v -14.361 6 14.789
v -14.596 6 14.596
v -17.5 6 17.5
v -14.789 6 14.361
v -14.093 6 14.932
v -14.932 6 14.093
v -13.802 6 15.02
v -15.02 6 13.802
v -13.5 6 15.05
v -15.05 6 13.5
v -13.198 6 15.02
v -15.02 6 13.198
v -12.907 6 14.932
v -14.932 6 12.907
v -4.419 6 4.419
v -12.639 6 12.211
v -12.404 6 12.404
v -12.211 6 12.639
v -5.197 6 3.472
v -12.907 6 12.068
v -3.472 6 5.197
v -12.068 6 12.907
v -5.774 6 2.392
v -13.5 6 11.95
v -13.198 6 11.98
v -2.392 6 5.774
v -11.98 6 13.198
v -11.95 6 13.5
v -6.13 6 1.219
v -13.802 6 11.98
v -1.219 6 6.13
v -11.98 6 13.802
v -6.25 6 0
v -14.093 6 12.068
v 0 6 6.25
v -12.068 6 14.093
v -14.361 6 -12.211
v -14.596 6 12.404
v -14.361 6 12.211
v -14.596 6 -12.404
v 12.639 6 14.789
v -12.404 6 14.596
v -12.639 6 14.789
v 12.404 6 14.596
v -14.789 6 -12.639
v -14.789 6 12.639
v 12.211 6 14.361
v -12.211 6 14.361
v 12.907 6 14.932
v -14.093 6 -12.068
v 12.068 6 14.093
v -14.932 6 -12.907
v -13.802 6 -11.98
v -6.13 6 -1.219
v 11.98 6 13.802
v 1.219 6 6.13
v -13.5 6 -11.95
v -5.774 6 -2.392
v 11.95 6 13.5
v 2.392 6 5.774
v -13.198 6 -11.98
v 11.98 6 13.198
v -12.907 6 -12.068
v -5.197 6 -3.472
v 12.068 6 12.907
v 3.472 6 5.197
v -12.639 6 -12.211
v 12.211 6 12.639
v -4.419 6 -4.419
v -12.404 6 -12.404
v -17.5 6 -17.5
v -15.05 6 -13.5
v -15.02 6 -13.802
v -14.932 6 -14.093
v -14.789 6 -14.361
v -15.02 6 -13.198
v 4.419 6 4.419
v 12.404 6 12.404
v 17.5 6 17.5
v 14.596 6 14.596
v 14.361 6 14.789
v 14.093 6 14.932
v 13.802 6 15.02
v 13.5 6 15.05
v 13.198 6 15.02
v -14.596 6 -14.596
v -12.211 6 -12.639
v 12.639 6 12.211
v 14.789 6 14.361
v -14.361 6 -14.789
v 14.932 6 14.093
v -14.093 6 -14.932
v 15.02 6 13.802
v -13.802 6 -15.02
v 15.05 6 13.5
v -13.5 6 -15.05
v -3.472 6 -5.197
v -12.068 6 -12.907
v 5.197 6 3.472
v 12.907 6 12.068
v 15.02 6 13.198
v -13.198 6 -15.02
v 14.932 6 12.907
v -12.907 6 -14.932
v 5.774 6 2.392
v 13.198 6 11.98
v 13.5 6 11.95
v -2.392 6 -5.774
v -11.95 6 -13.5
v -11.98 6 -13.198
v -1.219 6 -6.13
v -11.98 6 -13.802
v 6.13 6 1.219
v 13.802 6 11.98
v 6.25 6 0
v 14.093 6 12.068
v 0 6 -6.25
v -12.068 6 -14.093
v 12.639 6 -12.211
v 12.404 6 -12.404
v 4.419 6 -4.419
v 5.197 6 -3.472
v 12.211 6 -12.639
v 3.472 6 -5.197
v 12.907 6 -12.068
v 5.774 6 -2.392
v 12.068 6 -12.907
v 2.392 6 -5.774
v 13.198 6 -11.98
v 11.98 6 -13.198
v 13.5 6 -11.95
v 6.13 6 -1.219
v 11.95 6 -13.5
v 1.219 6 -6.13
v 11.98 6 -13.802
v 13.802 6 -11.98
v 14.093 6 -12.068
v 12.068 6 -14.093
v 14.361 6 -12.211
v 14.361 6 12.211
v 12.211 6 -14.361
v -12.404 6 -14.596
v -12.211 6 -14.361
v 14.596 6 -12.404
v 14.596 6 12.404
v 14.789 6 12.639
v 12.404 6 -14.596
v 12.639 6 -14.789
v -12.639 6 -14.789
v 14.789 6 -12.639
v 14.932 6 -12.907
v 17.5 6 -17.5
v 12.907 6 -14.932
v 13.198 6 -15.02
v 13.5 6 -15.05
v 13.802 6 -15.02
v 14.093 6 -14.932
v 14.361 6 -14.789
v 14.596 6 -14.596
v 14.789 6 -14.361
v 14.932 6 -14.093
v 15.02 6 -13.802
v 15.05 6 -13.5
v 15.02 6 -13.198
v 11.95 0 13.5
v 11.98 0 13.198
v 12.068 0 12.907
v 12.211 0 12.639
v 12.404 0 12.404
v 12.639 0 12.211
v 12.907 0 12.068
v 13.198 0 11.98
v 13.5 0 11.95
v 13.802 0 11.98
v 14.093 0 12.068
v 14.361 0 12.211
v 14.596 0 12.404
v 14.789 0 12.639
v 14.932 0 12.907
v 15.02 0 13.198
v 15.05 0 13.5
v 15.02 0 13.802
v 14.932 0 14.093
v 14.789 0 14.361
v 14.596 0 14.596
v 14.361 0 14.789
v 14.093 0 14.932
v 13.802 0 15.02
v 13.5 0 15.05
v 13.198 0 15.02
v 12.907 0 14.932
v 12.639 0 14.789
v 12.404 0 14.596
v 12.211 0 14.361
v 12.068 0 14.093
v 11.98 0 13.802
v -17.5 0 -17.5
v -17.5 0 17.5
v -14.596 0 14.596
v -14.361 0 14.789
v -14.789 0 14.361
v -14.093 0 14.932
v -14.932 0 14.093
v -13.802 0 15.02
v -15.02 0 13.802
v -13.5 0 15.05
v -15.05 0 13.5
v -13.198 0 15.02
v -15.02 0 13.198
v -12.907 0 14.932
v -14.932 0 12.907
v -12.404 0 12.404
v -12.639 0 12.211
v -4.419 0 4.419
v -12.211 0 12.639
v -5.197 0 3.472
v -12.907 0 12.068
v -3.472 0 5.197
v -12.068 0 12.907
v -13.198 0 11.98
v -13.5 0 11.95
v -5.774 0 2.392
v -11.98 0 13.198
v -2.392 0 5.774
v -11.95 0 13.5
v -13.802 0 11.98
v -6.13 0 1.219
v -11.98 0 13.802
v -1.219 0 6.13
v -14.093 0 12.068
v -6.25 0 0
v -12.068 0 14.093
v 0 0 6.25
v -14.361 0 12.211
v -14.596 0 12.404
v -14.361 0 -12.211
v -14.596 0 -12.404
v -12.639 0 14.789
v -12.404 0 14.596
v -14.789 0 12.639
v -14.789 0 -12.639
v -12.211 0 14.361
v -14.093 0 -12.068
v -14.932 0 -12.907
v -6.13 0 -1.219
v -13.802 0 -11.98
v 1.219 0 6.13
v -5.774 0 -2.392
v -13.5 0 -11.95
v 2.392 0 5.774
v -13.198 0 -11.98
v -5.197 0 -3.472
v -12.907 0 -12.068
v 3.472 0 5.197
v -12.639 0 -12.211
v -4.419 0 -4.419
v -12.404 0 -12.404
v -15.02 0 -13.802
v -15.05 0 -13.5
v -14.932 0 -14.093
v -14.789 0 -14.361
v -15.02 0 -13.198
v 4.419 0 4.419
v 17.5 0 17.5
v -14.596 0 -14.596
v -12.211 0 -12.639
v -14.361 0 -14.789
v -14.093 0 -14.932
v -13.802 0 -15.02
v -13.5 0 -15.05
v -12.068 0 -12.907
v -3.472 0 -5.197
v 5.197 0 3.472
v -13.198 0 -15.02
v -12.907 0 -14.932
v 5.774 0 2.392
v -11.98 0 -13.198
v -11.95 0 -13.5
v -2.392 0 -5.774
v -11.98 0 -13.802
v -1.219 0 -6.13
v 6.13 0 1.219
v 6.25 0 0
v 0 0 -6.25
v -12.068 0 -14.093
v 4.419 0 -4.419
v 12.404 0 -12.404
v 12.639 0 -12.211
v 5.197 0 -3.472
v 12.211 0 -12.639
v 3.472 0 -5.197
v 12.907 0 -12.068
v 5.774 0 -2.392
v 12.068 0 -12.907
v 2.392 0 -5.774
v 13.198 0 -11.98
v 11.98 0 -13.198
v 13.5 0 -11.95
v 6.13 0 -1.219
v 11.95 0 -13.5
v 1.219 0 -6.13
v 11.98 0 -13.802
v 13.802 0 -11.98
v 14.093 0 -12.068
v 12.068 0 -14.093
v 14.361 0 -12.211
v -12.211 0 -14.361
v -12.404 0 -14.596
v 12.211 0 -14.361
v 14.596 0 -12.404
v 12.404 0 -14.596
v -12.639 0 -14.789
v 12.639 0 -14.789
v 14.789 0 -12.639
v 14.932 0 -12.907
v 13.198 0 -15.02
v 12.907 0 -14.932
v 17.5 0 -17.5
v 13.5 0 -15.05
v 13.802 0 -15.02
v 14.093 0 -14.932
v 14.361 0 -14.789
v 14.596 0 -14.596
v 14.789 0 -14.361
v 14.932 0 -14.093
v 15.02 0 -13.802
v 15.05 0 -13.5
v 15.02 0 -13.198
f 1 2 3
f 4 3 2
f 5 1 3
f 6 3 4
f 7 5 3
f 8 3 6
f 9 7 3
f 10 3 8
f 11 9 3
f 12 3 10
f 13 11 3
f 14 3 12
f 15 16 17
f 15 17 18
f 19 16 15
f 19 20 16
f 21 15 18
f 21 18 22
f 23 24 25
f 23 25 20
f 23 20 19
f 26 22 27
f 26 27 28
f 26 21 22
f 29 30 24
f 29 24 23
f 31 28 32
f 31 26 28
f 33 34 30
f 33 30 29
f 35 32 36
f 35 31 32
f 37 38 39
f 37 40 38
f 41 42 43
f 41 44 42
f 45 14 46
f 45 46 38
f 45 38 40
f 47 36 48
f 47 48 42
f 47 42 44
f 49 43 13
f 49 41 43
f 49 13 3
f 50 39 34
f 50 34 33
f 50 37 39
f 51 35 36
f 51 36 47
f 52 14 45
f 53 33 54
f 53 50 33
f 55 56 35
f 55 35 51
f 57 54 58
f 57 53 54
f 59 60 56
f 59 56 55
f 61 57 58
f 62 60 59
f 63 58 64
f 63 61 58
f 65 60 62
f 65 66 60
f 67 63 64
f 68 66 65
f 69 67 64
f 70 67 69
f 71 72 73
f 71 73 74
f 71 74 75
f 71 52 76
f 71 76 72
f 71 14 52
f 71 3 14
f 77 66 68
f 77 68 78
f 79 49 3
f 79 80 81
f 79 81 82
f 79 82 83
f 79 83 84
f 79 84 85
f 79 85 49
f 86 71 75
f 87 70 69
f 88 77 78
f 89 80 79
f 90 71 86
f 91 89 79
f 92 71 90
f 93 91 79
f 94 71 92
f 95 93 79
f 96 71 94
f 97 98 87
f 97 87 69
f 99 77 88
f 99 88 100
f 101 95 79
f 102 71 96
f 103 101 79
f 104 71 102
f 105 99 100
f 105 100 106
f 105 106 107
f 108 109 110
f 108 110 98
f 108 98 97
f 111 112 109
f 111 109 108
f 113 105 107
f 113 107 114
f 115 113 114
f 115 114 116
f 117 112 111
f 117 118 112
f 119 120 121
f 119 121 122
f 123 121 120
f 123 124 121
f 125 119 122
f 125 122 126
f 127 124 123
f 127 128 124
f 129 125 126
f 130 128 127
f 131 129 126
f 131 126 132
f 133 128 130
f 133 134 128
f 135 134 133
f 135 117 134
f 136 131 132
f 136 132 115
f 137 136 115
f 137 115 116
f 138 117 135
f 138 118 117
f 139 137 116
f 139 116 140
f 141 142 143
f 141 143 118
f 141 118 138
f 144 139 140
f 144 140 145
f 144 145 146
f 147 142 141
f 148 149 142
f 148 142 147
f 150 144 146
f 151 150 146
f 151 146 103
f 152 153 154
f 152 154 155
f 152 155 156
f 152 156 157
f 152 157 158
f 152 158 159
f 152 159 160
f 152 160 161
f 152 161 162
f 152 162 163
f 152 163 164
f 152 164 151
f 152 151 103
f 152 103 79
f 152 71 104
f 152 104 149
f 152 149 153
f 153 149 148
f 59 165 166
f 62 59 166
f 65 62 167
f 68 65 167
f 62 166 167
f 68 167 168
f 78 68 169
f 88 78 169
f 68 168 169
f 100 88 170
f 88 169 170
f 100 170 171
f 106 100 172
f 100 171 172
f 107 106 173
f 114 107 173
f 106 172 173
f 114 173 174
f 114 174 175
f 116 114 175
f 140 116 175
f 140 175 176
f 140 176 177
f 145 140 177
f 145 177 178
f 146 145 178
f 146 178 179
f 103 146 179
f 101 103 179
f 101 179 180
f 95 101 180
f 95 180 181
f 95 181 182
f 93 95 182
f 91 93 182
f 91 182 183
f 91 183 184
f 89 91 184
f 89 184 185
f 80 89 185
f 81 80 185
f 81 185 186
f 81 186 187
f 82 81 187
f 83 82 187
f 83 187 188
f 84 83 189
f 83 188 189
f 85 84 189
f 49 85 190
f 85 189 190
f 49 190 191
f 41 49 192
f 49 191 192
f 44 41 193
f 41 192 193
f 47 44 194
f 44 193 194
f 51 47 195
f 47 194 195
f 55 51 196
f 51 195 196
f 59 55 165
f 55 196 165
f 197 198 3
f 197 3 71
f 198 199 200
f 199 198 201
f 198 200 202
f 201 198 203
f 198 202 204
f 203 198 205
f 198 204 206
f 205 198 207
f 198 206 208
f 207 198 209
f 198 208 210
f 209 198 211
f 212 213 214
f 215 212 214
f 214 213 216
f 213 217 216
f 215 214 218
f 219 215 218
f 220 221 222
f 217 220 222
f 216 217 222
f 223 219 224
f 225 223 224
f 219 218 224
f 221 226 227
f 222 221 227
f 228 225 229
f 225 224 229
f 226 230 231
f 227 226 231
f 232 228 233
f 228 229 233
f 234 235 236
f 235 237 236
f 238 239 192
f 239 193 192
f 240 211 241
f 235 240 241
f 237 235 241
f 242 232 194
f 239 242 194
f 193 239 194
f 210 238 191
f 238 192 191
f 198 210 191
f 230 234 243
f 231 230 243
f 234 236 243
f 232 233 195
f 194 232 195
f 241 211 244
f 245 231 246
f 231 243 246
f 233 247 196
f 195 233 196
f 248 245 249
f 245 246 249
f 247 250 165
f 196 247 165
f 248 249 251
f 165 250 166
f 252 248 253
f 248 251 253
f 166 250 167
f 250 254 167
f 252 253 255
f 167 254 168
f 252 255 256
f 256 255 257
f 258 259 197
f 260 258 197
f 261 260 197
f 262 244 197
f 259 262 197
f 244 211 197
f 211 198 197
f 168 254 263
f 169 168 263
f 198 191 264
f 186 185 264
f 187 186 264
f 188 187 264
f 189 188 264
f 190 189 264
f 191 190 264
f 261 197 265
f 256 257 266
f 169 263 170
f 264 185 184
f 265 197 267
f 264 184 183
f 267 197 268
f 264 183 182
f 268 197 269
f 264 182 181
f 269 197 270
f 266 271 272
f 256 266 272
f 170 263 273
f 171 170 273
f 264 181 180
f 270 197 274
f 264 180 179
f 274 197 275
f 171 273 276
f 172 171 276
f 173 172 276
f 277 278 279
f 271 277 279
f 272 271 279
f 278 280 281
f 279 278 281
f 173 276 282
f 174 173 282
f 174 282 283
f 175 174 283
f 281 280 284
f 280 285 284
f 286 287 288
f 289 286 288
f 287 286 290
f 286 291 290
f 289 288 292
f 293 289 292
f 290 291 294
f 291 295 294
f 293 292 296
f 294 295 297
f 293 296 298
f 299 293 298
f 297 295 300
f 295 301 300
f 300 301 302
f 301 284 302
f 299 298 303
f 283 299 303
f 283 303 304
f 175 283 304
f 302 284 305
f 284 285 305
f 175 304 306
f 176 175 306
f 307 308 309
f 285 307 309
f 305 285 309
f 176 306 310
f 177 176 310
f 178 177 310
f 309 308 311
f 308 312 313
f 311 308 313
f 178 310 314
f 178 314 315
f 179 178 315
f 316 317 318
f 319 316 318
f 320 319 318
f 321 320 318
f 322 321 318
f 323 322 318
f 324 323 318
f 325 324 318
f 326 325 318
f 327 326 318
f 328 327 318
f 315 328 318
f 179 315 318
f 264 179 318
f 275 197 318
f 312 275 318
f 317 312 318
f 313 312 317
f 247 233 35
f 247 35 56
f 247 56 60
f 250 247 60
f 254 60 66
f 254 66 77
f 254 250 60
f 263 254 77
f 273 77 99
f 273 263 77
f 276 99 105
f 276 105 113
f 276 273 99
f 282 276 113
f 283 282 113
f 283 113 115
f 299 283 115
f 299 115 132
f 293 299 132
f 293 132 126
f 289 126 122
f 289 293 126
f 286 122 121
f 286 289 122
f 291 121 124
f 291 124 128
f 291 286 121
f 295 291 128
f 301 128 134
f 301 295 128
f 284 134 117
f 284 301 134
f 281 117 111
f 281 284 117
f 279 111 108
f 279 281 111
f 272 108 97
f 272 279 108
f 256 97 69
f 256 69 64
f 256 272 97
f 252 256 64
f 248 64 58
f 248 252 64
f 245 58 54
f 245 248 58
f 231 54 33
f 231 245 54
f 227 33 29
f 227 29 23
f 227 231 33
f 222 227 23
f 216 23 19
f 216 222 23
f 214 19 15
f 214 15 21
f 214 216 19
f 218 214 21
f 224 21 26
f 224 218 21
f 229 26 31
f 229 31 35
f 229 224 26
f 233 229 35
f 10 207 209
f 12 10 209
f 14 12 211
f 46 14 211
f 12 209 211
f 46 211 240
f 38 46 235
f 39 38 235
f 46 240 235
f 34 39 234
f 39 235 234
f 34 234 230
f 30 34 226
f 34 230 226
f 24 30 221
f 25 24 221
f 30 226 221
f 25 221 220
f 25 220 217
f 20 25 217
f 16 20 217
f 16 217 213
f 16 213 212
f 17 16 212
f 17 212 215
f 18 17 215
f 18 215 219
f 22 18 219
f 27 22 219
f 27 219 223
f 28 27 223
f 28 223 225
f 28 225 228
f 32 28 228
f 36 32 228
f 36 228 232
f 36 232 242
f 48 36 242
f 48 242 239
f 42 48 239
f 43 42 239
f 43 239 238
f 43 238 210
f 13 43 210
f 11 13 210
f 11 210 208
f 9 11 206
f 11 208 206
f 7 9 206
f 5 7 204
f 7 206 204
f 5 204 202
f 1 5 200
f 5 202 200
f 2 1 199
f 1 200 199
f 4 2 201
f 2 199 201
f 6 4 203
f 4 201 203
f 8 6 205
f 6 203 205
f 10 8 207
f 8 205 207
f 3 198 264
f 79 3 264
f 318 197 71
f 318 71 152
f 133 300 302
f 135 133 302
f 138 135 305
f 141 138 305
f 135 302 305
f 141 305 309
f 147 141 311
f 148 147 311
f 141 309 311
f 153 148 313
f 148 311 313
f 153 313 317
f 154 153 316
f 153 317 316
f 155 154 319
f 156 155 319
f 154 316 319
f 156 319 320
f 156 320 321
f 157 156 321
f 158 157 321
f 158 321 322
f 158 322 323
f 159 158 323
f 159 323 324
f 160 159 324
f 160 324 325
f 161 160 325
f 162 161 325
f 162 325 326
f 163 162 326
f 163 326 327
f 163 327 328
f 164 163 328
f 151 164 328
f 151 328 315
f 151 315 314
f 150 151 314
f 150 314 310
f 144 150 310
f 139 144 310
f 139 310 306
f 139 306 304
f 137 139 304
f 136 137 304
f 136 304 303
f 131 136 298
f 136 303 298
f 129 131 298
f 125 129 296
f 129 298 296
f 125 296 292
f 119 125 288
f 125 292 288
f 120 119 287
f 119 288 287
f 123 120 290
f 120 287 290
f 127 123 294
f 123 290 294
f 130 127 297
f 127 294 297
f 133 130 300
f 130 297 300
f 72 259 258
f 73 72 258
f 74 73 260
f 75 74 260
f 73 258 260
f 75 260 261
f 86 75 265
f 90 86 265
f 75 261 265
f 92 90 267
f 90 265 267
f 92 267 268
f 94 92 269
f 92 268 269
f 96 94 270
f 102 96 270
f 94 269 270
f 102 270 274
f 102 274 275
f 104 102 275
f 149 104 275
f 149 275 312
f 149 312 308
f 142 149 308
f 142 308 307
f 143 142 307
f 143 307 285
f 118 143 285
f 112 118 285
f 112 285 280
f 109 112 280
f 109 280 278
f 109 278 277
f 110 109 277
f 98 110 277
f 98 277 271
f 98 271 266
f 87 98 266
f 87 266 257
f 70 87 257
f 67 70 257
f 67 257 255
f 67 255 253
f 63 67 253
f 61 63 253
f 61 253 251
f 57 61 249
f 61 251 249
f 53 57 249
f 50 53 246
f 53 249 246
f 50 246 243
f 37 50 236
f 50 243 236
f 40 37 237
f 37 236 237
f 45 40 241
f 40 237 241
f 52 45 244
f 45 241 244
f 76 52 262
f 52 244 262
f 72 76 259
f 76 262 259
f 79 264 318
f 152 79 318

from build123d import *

# Parameters (mm, degrees)
SKETCH1_W            = 35
SKETCH1_H            = 35
SKETCH1_R            = 6.25
BOSS_EXTRUDE1_DEPTH  = 6
M3_CLEARANCE_HOLE1_D = 3.1


with BuildPart() as part:
    # Sketch1 → Boss-Extrude1 (new body)
    with BuildSketch(Plane(origin=(0, 0, 0), x_dir=(1, 0, 0), z_dir=(0, 1, 0))):
        Rectangle(SKETCH1_W, SKETCH1_H)
        with Locations(Location((0, 0, 0), (0, 0, 270))):
            Circle(SKETCH1_R, mode=Mode.SUBTRACT)
    extrude(amount=BOSS_EXTRUDE1_DEPTH)

    # M3 Clearance Hole1 (through all)
    with Locations(Plane(origin=(0, 6, 0), x_dir=(1, 0, 0), z_dir=(0, 1, 0))):
        with Locations((-13.5, 13.5), (13.5, 13.5), (13.5, -13.5), (-13.5, -13.5), (0, 0)):
            Hole(M3_CLEARANCE_HOLE1_D / 2)


solid = part.part
